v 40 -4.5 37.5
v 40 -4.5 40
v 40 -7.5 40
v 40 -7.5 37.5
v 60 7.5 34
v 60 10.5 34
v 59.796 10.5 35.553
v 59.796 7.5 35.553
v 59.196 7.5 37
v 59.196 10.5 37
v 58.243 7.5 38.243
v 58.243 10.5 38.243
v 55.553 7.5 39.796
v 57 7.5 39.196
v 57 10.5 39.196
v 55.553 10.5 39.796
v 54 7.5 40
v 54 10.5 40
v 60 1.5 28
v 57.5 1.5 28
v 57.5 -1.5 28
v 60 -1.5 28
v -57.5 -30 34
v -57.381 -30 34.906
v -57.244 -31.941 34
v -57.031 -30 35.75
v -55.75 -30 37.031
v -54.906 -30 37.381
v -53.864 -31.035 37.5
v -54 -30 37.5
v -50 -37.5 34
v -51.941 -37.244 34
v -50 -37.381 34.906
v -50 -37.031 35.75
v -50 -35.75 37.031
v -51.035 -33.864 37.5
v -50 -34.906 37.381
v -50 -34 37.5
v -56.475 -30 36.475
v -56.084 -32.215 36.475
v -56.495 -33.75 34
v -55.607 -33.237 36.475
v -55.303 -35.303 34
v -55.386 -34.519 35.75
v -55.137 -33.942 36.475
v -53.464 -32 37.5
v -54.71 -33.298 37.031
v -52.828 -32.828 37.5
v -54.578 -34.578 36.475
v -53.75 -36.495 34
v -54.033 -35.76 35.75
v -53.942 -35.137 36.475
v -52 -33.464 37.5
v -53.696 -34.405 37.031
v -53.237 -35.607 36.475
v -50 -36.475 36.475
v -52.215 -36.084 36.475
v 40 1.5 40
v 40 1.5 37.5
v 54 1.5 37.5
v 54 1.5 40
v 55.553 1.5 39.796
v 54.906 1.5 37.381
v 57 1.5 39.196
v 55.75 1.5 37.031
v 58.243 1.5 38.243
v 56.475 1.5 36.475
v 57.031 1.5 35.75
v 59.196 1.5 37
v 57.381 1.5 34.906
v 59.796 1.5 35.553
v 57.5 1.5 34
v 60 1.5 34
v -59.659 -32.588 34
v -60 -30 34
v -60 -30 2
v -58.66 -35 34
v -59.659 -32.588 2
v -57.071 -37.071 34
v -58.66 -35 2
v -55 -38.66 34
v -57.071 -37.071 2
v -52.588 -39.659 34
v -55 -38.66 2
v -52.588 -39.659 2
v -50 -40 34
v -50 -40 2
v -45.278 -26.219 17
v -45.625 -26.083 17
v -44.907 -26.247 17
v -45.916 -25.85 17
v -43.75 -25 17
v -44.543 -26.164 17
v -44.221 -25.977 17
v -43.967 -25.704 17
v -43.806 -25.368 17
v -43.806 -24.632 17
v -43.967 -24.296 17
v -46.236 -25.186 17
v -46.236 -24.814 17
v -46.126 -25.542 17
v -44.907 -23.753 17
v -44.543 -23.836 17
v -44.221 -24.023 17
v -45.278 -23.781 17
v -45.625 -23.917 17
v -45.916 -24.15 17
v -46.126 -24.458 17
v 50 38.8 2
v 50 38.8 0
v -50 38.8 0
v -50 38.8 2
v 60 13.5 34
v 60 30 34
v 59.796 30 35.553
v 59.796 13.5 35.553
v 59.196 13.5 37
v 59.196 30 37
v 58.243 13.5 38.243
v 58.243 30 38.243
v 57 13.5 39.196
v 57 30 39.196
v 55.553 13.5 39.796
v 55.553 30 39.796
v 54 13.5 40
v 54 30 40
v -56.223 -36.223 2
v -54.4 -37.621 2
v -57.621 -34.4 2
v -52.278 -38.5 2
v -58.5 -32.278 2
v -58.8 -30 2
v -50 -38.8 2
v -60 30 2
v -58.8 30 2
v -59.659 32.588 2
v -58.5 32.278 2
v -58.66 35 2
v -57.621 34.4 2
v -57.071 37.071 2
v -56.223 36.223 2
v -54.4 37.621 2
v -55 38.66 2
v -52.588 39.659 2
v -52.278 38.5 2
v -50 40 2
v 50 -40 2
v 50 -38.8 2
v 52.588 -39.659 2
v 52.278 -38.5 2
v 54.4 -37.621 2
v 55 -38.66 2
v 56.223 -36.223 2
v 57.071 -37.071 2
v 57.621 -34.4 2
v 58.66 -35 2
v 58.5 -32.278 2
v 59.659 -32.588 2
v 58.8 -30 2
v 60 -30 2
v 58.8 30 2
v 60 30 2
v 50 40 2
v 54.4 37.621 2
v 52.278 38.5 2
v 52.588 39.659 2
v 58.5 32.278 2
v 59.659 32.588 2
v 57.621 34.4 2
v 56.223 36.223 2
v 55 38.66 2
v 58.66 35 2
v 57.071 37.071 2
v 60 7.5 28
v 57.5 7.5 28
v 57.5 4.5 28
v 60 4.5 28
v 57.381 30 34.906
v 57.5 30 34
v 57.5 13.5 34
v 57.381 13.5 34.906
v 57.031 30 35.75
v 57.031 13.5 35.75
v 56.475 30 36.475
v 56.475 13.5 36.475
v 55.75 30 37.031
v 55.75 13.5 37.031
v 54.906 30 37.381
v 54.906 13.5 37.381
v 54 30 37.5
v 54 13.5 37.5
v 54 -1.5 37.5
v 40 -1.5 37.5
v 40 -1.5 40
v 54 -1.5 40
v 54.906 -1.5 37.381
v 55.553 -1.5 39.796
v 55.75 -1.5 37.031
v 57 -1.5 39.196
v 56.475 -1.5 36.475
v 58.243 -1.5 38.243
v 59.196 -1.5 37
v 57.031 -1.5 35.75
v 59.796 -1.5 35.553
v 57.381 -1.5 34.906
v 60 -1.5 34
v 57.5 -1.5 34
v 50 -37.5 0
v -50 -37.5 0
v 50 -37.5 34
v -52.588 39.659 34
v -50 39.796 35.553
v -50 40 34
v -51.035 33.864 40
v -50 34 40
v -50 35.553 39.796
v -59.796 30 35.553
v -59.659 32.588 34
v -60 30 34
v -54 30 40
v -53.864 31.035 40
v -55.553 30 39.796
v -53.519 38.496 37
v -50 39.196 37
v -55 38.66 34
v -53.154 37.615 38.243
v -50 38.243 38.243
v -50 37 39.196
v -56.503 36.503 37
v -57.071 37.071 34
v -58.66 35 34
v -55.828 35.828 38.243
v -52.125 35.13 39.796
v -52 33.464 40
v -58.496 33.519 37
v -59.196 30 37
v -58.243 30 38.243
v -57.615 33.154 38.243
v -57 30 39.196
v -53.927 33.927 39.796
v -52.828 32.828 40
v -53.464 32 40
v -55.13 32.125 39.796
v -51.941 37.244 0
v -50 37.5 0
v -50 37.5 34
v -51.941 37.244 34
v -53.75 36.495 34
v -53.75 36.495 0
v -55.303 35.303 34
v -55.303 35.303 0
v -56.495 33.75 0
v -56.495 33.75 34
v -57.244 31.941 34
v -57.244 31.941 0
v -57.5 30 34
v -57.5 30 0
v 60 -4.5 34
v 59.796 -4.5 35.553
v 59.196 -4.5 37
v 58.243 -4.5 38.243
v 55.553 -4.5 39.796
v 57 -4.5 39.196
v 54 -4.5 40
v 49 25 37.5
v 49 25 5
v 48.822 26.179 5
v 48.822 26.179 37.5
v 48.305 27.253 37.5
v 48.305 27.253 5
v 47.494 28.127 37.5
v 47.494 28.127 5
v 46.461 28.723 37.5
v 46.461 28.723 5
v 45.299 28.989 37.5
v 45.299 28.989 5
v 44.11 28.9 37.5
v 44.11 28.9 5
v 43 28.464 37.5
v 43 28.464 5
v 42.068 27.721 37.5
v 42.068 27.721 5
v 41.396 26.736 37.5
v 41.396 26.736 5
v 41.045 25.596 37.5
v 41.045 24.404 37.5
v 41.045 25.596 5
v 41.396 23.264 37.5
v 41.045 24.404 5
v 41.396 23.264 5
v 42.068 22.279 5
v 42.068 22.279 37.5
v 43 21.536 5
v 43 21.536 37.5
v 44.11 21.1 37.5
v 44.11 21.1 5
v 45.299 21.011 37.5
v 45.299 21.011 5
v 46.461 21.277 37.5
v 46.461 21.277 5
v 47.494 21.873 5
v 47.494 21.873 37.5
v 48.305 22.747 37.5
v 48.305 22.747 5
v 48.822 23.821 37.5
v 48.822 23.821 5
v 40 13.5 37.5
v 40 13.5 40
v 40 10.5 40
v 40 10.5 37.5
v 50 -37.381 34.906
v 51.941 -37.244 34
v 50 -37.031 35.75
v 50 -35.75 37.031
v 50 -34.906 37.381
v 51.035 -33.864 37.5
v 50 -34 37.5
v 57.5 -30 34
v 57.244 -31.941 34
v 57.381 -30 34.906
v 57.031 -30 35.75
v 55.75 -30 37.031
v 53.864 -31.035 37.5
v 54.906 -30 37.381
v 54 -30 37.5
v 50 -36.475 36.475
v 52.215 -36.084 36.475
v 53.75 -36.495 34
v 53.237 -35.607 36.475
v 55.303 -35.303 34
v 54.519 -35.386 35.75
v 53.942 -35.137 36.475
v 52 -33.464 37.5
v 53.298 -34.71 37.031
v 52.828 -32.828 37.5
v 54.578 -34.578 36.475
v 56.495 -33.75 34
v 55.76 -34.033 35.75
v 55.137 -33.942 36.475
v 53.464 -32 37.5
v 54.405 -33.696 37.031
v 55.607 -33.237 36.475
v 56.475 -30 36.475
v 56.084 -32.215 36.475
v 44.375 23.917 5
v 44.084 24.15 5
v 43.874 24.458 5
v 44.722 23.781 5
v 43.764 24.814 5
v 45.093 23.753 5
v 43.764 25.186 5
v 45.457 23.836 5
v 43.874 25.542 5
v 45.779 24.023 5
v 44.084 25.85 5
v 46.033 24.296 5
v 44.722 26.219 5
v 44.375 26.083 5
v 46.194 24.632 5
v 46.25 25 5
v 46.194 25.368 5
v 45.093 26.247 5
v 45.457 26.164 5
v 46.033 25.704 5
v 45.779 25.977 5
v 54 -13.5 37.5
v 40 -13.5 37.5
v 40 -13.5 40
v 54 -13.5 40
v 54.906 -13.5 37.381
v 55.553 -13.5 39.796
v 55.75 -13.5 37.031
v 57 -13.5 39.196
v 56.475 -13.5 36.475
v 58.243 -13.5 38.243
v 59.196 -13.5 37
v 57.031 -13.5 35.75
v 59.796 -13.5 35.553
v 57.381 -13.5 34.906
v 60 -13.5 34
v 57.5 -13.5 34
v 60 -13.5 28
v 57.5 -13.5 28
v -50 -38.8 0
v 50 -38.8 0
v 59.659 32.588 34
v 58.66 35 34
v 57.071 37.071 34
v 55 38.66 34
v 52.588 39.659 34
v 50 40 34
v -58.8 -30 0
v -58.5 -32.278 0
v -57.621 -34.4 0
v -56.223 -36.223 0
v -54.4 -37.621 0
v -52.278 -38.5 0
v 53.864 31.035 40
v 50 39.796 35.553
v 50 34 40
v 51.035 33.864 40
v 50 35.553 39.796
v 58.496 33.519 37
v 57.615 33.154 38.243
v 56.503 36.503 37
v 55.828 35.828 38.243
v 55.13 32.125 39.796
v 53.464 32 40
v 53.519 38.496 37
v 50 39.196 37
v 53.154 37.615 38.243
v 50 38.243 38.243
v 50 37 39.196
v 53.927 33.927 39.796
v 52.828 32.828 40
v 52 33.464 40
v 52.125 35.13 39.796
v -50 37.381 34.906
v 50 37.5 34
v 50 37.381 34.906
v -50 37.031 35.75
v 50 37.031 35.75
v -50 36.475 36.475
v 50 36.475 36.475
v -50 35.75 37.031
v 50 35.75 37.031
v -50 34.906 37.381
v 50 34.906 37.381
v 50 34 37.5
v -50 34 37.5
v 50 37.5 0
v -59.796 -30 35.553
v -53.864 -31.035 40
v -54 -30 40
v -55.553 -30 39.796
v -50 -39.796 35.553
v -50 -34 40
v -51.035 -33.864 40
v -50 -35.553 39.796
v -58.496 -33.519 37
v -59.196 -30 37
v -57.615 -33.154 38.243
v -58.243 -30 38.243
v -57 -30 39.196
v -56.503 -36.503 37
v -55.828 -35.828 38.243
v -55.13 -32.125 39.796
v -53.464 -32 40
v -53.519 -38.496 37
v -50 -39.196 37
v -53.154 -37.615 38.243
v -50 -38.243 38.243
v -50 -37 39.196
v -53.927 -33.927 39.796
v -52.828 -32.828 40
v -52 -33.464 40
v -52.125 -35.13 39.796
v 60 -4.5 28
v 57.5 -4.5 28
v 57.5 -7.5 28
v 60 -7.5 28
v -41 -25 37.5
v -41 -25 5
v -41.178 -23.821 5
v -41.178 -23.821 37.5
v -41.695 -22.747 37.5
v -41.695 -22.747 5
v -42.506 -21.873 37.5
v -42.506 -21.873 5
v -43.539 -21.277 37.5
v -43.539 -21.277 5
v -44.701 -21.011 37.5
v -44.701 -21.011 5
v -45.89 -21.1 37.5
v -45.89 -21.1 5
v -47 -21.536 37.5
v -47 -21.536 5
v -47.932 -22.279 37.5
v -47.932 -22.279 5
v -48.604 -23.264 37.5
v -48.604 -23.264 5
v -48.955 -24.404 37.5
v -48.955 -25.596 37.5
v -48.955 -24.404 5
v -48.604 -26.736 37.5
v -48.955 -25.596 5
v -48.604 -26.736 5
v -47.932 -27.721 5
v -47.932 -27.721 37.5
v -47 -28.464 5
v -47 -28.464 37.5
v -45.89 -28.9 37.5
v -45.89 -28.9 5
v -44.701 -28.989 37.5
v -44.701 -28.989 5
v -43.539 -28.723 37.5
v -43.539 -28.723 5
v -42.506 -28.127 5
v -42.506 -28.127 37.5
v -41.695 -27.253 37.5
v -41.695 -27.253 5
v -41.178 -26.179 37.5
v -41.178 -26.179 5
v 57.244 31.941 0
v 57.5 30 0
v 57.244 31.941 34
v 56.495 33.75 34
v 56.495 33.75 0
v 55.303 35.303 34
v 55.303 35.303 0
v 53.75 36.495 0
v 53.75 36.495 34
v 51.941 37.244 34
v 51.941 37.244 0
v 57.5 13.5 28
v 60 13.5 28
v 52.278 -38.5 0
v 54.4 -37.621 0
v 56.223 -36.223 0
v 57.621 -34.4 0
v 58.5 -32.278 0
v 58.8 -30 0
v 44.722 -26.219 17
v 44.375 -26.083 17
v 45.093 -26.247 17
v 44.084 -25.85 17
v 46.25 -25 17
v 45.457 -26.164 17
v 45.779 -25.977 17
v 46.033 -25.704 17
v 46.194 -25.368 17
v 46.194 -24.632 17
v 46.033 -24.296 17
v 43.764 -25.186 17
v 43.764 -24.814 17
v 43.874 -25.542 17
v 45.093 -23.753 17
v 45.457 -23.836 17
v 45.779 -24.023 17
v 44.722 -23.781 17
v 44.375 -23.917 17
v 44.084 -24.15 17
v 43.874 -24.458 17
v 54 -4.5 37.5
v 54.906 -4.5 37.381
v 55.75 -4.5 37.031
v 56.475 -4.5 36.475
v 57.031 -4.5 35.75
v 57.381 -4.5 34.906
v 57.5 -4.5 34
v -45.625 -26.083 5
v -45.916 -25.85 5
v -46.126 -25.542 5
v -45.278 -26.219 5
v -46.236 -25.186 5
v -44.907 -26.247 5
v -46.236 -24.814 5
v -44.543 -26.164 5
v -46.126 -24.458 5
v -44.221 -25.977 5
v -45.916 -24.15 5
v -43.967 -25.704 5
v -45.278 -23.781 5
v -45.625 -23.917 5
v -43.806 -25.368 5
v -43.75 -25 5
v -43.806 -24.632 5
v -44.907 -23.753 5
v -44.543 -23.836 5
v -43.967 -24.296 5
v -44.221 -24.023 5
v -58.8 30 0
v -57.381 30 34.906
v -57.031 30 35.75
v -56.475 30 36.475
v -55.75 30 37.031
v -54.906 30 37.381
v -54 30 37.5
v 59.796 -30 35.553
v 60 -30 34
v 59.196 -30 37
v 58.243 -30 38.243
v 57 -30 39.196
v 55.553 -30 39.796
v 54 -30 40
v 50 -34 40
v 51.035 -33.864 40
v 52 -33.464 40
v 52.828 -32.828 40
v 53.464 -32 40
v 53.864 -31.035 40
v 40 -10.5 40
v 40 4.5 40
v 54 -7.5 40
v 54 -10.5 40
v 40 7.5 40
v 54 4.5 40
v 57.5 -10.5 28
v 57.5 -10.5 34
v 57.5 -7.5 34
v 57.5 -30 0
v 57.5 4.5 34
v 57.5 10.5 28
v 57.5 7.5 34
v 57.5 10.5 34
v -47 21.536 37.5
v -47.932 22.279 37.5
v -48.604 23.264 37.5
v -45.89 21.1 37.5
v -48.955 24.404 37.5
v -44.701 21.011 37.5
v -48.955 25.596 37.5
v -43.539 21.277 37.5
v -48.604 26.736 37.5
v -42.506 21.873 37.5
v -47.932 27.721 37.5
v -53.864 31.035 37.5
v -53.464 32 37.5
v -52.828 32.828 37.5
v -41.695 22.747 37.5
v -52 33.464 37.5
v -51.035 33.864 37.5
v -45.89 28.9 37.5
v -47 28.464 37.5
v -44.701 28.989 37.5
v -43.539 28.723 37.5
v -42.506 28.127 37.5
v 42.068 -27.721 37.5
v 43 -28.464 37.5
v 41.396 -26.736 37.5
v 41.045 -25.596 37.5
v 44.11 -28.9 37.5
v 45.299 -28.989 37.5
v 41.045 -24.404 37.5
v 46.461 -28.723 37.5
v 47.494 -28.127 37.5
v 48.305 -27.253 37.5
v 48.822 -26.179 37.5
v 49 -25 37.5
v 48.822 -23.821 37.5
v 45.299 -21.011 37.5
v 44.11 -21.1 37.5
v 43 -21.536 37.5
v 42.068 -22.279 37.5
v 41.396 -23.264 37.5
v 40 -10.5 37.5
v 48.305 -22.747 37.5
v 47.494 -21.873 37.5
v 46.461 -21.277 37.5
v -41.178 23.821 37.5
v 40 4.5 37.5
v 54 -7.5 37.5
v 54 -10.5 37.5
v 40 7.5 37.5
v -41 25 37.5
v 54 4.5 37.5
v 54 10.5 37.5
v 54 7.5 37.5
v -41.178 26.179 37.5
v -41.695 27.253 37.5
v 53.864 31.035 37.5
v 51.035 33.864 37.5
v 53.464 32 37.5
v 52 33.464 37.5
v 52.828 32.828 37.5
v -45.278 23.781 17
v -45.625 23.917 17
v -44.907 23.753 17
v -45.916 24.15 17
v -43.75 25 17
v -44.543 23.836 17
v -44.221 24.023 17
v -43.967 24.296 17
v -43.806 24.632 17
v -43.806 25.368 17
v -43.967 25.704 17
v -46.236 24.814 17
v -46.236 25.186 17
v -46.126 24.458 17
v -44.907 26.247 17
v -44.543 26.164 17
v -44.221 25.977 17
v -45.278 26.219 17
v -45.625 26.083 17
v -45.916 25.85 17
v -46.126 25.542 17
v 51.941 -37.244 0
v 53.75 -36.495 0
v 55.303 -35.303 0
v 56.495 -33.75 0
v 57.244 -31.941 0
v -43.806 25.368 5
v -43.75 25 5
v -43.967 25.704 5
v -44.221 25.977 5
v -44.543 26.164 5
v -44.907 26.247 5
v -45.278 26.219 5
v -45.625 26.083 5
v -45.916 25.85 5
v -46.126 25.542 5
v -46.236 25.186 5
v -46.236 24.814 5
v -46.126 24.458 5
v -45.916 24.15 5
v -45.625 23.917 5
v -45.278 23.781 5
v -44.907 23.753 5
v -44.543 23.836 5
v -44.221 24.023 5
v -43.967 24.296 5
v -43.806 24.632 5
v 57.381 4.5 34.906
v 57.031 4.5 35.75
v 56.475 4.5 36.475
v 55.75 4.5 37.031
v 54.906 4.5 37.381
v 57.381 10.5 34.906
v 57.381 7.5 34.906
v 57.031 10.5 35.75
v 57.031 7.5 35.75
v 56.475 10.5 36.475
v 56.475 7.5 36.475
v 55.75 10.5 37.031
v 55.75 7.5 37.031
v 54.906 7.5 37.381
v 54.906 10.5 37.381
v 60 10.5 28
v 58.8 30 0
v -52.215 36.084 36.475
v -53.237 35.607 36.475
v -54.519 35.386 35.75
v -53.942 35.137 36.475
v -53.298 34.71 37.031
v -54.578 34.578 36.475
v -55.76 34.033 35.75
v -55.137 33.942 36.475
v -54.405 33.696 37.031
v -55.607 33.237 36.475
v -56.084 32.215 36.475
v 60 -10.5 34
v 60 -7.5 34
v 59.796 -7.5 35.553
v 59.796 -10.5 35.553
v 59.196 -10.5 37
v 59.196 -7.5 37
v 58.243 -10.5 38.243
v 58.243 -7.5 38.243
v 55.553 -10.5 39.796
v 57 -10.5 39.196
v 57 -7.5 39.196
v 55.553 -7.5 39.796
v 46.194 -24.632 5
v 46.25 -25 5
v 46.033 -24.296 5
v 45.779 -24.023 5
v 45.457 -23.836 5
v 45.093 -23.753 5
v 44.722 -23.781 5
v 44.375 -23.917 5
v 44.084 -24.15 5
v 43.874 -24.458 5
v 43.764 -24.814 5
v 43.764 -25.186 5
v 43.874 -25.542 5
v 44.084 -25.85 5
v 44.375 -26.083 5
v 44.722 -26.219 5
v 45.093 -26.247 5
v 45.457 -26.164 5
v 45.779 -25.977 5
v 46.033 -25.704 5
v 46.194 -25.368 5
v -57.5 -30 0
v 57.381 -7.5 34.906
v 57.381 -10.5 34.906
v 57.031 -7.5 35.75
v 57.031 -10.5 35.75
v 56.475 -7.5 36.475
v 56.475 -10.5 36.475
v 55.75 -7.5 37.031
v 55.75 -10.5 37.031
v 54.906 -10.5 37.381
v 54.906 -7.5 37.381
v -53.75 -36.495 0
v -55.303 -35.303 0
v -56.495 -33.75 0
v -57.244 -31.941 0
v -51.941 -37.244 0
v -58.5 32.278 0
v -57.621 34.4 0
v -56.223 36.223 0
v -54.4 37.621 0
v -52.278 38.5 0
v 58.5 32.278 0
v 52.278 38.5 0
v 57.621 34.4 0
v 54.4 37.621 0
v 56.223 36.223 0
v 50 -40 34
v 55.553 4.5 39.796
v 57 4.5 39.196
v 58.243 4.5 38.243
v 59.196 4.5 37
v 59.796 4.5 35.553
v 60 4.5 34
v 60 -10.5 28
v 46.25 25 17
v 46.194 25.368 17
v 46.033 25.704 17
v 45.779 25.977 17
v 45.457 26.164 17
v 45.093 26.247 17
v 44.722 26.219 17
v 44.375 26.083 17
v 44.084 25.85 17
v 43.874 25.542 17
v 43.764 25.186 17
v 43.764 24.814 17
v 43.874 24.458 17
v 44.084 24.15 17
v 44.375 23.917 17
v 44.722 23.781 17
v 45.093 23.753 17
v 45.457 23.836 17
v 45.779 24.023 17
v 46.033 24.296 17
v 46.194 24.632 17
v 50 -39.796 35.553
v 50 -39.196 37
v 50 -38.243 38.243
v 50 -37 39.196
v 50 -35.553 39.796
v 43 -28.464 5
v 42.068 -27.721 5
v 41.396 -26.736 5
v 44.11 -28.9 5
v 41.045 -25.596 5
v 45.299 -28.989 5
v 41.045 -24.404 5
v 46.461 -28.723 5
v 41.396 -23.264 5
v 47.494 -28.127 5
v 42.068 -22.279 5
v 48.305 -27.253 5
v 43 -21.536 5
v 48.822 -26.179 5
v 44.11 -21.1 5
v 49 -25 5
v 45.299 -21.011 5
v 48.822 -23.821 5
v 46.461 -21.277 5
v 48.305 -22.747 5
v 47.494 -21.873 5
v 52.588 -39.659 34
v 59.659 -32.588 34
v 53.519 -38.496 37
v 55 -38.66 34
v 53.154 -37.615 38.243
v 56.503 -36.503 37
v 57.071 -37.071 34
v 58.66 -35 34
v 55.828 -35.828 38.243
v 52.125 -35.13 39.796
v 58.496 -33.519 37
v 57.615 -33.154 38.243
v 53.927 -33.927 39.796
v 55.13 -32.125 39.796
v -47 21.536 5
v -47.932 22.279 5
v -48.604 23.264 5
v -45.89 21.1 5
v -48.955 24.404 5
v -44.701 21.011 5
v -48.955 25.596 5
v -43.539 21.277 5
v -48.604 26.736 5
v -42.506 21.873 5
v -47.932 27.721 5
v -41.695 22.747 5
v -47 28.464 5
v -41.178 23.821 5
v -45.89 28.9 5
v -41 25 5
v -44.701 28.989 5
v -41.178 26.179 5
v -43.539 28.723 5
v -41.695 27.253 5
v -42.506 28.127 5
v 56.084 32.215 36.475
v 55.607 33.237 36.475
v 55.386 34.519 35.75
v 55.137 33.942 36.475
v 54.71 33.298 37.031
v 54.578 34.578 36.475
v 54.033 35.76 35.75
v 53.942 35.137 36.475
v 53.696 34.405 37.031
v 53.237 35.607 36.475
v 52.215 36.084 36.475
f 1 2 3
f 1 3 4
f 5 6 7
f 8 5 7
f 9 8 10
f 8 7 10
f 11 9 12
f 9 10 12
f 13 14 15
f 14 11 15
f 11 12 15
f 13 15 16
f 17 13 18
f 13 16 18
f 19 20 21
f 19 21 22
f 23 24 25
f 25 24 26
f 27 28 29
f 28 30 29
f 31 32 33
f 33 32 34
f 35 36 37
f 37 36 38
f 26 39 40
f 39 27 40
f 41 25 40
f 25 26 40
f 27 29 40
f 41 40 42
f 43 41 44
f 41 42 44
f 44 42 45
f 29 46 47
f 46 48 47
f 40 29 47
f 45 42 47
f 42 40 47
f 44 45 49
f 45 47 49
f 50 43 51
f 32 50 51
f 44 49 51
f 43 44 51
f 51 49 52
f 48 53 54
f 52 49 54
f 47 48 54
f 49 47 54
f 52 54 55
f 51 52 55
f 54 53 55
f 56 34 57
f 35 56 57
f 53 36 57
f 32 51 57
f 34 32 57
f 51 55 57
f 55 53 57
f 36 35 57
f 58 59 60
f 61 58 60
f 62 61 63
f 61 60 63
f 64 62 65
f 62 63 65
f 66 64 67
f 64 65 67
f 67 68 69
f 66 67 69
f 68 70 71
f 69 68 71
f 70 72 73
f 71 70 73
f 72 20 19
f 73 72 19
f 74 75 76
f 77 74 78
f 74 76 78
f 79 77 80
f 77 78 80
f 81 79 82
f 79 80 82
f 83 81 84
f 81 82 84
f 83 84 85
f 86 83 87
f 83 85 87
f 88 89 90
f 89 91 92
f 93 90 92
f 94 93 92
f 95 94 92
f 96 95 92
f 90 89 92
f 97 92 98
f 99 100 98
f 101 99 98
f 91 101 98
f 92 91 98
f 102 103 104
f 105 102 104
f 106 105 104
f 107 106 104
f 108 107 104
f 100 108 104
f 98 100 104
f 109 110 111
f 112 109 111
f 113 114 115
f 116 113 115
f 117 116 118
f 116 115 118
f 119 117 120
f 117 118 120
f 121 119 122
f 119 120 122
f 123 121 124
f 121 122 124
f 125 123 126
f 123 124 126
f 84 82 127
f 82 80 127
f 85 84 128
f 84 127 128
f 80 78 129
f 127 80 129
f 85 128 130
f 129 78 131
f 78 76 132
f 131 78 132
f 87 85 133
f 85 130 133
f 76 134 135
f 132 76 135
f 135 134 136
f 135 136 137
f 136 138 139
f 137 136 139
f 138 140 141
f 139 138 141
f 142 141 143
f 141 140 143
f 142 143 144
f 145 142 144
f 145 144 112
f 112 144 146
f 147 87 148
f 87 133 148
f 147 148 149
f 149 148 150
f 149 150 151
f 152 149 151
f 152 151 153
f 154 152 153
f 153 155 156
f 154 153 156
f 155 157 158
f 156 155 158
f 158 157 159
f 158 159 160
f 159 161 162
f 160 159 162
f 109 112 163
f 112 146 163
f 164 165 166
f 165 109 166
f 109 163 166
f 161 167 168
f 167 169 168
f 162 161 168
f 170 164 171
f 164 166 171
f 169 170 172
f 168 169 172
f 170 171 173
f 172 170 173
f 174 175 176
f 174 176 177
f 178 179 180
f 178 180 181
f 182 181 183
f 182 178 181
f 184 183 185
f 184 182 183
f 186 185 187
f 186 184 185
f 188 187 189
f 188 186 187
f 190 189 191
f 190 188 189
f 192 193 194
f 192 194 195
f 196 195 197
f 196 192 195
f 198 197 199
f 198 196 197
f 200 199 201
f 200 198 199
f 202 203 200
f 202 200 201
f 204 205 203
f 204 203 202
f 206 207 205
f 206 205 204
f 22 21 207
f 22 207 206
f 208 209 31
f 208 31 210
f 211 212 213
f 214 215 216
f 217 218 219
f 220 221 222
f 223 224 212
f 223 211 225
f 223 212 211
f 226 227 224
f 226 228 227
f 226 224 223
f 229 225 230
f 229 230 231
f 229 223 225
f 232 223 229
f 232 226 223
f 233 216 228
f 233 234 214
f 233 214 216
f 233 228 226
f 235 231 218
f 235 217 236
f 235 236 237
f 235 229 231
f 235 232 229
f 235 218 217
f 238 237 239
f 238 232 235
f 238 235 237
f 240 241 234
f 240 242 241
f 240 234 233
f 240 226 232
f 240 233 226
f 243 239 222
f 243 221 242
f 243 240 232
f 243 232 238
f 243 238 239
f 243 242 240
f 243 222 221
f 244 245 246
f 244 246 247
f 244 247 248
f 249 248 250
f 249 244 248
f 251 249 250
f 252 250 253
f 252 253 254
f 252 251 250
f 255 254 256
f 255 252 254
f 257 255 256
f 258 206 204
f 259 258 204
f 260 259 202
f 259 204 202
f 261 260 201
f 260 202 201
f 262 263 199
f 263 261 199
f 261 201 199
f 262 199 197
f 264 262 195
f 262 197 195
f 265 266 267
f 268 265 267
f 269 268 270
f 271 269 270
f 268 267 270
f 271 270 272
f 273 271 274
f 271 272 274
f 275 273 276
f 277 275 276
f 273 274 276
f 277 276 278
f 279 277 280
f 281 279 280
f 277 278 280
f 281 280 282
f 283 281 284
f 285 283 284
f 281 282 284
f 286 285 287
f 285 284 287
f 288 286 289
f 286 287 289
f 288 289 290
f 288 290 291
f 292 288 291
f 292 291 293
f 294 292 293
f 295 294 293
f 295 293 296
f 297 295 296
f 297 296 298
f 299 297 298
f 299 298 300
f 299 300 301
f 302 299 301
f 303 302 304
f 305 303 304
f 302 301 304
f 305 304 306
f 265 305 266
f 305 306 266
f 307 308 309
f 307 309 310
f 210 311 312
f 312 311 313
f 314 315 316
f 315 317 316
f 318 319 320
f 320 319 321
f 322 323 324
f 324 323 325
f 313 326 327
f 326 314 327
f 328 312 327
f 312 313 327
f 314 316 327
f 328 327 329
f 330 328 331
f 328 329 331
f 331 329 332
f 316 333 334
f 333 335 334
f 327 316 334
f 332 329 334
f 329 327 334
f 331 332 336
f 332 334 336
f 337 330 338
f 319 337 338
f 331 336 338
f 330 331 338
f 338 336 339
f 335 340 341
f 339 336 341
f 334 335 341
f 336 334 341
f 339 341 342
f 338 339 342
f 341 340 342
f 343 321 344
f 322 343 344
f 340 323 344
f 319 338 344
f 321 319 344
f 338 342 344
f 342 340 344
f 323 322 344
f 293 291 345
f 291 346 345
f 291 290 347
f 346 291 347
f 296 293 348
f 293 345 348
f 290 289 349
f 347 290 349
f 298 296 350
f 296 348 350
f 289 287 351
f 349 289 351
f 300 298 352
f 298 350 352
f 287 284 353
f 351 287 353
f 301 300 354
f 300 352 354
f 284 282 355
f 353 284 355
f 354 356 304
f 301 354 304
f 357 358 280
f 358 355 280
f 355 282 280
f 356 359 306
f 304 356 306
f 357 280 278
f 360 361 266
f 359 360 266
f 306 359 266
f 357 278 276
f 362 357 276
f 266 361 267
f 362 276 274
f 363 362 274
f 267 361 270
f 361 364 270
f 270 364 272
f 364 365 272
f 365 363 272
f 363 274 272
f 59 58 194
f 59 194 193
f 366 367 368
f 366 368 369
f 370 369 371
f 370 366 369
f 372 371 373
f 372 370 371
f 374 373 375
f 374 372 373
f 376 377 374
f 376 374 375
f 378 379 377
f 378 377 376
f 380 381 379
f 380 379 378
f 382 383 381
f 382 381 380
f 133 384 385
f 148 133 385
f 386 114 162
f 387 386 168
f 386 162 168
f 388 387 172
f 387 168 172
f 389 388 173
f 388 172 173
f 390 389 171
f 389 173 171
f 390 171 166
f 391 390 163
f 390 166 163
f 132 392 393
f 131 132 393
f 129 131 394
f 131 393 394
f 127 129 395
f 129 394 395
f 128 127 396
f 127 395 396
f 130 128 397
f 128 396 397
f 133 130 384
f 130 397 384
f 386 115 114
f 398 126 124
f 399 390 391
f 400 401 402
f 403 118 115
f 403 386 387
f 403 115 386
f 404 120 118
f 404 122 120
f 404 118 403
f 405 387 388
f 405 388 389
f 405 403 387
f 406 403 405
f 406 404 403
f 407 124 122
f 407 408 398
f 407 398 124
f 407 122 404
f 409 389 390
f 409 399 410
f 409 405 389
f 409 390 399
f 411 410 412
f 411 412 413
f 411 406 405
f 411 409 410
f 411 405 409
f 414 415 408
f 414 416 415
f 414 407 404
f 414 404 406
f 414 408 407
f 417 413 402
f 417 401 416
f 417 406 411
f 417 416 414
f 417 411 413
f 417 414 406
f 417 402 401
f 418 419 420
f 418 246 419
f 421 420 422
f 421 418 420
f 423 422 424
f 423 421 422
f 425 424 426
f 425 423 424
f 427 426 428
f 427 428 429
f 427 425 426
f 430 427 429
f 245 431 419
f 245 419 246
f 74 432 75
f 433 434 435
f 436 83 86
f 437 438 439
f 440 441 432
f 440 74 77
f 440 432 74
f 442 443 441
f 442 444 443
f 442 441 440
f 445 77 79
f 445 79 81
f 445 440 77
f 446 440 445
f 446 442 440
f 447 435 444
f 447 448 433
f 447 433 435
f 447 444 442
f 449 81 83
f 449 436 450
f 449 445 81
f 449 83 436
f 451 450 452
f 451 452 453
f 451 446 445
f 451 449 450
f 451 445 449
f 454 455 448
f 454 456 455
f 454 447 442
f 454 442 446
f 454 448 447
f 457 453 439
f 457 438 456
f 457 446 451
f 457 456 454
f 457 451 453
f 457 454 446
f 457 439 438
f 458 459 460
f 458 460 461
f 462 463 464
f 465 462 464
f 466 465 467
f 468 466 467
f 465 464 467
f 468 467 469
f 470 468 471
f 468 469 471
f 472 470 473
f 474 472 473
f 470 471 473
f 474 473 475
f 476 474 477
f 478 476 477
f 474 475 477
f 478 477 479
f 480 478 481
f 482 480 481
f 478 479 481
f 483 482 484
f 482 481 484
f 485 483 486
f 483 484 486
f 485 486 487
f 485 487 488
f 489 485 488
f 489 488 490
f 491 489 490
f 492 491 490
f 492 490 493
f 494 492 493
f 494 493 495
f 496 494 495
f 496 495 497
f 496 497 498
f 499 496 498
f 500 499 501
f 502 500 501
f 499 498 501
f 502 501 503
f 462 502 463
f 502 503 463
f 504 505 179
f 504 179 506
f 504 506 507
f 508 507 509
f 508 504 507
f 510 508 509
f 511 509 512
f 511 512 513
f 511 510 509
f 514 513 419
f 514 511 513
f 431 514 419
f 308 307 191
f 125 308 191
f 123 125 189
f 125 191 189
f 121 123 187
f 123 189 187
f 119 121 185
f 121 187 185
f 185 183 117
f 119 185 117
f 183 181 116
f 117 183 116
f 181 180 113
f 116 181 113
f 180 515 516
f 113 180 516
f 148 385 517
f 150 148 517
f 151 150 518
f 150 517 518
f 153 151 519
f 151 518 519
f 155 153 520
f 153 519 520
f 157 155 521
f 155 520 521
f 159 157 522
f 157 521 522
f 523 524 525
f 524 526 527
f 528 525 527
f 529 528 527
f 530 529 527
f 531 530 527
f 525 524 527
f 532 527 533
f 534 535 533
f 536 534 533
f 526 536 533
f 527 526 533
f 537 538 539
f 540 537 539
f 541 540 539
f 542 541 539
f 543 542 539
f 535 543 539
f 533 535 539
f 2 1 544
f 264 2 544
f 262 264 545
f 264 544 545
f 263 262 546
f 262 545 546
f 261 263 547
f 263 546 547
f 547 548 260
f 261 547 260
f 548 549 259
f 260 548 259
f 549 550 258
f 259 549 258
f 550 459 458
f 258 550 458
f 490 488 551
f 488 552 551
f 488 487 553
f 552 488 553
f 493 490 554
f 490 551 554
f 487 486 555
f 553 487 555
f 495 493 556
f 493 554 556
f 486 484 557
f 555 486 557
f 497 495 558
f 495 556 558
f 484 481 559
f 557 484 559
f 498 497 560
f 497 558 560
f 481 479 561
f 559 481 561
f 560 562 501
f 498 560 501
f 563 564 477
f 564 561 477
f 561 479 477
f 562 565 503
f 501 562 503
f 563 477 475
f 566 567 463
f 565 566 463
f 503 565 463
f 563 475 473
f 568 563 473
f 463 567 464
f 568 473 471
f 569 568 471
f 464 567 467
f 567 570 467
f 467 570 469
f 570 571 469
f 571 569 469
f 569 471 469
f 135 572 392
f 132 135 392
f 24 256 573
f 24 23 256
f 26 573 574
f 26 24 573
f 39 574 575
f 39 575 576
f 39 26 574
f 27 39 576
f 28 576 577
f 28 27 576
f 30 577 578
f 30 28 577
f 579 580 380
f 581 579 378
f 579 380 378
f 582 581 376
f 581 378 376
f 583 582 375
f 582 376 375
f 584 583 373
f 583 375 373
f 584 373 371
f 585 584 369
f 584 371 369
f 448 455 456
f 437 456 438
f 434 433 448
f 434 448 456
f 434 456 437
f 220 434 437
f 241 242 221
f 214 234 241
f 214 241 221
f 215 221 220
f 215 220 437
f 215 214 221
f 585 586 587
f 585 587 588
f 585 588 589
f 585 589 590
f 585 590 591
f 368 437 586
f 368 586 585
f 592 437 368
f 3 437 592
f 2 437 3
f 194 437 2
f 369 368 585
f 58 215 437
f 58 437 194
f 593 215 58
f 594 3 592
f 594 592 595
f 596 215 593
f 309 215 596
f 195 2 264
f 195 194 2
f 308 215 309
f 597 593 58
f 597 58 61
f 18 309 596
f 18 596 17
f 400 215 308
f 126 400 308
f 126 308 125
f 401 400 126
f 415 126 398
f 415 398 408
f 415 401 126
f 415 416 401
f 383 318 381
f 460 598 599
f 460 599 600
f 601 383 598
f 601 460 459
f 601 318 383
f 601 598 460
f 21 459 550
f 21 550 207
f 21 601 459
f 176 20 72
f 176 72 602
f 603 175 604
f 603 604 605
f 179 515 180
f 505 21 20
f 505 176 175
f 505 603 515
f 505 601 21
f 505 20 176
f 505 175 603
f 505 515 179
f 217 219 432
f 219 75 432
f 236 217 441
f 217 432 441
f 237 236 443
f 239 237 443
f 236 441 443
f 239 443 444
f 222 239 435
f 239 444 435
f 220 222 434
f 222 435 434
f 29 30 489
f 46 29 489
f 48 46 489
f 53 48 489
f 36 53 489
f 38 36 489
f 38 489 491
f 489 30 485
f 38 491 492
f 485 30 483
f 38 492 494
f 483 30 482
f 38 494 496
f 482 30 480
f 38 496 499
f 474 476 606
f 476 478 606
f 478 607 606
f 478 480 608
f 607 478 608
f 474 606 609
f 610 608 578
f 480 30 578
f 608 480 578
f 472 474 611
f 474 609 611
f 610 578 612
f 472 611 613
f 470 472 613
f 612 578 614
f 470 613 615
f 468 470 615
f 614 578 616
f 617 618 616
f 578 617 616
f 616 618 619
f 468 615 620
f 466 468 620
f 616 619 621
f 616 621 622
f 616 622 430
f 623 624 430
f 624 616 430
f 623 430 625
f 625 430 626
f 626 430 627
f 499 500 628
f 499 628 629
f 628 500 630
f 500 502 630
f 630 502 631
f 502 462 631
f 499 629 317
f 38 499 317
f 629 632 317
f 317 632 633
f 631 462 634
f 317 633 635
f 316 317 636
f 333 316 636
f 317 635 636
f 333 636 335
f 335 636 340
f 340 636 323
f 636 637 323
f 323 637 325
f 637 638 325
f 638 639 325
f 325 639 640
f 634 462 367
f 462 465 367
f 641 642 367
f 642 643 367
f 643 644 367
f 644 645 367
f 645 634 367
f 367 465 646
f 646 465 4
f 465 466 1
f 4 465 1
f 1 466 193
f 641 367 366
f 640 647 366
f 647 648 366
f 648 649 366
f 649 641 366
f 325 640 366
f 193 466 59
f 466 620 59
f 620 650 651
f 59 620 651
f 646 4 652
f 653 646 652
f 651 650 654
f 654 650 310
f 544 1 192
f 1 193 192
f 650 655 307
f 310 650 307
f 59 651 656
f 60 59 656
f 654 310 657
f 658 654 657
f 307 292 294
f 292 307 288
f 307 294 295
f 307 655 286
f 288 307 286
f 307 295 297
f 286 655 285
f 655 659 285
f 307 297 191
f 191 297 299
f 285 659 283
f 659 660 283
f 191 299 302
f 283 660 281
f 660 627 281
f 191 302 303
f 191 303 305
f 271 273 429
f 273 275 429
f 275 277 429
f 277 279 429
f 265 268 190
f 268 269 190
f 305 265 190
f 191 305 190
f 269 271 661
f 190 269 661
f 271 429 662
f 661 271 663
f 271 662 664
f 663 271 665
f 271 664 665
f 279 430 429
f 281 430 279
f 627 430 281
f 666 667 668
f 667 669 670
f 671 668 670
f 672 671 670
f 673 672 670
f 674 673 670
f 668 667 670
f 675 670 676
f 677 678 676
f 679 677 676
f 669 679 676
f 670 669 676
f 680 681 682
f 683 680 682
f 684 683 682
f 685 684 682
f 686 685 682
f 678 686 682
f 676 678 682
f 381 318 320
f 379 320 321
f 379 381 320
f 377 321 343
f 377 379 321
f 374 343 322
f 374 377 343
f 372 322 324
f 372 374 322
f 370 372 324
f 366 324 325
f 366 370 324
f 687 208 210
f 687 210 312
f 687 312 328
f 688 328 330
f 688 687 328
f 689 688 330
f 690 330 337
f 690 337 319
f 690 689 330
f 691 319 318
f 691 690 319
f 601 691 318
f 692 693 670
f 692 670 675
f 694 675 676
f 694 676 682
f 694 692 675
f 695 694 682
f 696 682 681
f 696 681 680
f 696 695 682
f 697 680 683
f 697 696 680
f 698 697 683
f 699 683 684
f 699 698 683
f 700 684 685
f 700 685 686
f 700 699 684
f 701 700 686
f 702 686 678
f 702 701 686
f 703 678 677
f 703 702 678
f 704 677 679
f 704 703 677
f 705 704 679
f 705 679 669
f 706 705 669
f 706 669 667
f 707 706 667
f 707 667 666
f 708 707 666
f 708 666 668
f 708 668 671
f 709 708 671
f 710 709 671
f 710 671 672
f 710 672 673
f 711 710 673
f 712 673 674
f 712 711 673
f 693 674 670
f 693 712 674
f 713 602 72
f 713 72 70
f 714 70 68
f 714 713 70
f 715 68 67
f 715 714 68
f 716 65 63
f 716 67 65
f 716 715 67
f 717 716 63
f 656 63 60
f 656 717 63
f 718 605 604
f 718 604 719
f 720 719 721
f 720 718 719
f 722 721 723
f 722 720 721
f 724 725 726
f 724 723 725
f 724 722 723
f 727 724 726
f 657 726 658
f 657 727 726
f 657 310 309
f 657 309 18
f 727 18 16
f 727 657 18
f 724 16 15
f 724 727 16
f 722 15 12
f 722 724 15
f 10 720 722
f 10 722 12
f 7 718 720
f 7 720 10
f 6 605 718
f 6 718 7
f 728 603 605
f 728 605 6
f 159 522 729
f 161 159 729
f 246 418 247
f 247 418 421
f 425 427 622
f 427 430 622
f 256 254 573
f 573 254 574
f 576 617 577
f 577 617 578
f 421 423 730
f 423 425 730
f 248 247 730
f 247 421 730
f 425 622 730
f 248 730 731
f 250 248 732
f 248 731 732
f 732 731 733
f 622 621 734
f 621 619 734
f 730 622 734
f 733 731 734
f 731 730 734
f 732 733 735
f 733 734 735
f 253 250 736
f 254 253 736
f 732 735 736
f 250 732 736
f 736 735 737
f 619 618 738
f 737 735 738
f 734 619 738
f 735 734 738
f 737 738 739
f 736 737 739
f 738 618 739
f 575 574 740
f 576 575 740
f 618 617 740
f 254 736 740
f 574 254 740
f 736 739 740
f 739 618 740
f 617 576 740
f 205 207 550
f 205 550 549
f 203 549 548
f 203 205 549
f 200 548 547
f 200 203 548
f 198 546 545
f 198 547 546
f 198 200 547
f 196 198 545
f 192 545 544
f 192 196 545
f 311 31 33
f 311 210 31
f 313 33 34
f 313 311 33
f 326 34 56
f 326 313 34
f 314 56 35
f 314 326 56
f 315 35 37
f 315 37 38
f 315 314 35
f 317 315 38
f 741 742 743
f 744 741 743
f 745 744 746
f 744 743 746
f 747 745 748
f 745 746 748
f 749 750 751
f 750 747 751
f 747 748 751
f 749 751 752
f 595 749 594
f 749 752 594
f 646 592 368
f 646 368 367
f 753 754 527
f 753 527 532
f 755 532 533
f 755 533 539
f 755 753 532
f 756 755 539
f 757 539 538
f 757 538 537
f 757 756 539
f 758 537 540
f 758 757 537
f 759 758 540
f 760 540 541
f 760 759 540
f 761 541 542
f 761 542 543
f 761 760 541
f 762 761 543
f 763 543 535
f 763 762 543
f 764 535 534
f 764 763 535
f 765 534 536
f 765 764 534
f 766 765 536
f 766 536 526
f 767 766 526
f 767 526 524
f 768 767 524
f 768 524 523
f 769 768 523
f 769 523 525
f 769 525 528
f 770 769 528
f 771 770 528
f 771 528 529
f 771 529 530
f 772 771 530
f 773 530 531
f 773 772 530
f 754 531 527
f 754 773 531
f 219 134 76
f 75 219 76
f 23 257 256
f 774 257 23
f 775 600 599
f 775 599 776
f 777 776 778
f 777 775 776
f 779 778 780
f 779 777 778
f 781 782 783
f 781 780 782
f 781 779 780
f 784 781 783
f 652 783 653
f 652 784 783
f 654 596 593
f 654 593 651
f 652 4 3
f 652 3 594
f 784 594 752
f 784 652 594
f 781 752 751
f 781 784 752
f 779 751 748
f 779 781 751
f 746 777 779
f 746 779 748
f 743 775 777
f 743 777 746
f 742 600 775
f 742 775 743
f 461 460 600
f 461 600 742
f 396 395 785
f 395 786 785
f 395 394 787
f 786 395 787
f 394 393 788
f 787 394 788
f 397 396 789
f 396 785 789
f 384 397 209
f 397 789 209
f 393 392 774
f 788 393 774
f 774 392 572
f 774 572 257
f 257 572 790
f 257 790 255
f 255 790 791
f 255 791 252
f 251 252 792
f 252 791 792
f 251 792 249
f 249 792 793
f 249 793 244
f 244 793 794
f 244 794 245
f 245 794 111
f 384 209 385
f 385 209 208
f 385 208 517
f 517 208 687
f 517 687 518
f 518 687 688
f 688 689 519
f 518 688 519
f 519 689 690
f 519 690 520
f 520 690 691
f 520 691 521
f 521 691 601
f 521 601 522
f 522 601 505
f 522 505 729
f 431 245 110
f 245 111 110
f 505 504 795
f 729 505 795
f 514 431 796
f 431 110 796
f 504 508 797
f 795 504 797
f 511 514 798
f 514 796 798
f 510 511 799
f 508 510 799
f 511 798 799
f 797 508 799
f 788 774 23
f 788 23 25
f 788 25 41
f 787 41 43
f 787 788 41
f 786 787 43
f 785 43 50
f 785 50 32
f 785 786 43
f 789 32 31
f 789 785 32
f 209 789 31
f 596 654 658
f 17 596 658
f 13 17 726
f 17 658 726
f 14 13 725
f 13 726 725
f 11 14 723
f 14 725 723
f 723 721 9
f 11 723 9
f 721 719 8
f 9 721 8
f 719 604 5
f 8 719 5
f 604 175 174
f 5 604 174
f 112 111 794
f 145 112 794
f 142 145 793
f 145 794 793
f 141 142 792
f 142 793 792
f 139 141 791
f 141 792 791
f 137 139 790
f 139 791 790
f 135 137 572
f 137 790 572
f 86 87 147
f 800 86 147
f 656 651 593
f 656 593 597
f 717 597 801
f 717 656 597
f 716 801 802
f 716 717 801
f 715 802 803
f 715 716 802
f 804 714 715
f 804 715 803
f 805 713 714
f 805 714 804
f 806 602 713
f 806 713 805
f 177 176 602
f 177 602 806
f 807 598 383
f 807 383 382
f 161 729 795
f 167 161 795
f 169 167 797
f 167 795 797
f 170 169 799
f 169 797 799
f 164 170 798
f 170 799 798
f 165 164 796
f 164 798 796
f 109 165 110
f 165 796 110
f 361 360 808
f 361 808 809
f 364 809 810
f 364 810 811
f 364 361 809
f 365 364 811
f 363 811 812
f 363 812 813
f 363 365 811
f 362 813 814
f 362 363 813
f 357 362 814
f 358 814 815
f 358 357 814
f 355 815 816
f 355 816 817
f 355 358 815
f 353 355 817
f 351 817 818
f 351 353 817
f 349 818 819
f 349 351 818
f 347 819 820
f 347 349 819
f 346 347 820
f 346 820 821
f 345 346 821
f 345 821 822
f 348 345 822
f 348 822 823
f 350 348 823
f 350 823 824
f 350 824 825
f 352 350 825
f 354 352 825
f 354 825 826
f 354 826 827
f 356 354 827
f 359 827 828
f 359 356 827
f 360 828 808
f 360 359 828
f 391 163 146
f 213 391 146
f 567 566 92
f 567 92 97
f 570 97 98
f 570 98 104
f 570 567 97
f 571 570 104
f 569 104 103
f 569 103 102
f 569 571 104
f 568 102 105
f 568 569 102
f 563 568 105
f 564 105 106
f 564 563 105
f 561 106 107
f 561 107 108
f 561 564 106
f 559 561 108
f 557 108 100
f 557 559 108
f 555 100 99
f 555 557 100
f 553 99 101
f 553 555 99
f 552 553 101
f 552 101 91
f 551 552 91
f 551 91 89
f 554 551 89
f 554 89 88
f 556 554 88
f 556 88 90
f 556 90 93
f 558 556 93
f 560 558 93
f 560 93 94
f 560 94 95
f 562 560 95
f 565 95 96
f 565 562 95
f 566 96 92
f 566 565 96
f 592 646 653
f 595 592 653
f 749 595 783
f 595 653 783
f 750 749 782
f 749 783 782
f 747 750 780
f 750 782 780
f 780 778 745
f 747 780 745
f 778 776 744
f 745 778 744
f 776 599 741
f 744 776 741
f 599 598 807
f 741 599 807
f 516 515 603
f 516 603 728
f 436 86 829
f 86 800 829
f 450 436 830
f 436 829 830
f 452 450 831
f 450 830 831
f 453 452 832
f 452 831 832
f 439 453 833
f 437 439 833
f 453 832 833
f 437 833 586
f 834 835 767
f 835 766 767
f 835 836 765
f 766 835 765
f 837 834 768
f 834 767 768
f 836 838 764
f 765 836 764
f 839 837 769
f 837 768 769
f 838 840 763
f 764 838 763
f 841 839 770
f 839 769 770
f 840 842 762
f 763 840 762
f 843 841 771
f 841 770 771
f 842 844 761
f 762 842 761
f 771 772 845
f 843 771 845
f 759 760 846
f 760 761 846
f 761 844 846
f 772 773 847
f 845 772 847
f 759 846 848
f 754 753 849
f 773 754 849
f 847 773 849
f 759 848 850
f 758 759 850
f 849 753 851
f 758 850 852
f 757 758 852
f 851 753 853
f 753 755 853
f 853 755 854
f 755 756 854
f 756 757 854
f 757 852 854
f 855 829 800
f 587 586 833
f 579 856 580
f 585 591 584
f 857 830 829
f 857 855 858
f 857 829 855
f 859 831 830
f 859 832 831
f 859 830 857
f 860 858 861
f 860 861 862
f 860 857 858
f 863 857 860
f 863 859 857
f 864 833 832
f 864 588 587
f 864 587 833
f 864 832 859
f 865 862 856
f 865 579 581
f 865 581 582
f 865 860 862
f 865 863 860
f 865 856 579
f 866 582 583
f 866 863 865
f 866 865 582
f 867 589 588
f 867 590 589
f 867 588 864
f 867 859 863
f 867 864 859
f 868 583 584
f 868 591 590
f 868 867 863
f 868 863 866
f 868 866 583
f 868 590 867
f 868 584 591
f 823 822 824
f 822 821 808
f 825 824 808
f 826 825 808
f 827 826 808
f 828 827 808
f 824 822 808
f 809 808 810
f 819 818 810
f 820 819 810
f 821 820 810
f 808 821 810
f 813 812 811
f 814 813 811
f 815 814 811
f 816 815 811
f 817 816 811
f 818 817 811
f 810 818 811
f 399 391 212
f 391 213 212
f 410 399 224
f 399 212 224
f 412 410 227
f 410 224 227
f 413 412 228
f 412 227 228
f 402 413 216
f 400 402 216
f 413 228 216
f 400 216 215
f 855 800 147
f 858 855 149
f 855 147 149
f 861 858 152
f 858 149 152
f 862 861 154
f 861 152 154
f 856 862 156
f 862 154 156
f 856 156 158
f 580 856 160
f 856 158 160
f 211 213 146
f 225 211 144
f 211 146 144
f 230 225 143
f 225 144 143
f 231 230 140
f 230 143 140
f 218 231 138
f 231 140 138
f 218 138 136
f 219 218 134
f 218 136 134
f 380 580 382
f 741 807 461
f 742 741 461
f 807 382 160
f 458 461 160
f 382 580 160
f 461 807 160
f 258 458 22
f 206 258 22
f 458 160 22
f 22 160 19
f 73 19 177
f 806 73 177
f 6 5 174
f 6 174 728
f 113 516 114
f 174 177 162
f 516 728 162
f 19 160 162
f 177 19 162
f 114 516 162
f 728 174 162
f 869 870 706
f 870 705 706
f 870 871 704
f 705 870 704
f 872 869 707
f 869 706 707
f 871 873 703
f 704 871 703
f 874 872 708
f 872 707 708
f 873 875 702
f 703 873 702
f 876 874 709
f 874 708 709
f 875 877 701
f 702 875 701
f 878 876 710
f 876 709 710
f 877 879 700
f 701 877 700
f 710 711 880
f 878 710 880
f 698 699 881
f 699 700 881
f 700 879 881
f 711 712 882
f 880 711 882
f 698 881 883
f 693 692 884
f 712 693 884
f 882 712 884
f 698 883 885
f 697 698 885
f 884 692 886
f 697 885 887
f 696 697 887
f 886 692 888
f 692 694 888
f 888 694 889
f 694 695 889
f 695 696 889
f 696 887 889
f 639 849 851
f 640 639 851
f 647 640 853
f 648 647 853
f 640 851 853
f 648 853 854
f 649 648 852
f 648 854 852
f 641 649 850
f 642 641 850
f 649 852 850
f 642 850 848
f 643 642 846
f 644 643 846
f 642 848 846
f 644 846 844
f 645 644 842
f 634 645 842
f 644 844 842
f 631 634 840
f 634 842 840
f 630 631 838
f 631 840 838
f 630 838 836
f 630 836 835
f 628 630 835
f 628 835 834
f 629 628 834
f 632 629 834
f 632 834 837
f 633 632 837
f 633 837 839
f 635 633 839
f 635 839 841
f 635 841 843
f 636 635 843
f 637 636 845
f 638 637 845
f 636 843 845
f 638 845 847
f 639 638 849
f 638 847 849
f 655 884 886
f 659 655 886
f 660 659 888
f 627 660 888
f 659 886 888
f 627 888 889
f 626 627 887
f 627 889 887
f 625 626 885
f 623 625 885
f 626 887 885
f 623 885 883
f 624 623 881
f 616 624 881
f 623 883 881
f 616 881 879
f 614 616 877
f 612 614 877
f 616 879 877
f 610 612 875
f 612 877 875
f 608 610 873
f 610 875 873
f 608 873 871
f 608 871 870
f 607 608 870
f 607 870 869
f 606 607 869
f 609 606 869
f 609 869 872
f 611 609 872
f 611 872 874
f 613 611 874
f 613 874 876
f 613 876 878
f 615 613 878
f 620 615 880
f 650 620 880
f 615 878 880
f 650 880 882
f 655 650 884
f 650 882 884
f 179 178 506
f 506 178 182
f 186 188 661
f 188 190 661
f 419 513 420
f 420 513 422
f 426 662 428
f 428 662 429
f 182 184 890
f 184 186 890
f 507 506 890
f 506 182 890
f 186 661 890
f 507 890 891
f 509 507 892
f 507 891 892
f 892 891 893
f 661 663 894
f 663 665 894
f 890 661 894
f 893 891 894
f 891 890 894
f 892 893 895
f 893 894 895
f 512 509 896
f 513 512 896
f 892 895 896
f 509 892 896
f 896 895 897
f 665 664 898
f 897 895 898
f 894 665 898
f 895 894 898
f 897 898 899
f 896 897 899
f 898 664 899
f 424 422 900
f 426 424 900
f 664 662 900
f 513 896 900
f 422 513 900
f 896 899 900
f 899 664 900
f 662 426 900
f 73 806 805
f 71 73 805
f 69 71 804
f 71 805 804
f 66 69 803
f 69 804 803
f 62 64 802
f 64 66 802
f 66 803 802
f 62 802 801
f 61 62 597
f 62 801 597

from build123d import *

# Parameters (mm, degrees)
EXTRUDE_1_DEPTH        = 40
FILLET_1_R             = 6
SHELL_1_T              = -2.5
CUT_EXTRUDE_1_DEPTH    = 2
SKETCH_5_W             = 25
SKETCH_5_H             = 17
CUT_EXTRUDE_4_DEPTH    = 1.5
PATTERN_LINEAR_1_COUNT = 5
PATTERN_LINEAR_1_PITCH = 6
SKETCH_6_R             = 4
EXTRUDE_2_DEPTH        = 32.5
SKETCH_7_R             = 1.25
CUT_EXTRUDE_5_DEPTH    = 12


with BuildPart() as part:
    # 草图1 → 凸台-拉伸1 (new body)
    with BuildSketch(Plane.XY):
        with BuildLine():
            Line((-50, -40), (50, -40))
            ThreePointArc((50, -40), (57.071067812, -37.071067812), (60, -30))
            Line((60, -30), (60, 30))
            ThreePointArc((60, 30), (57.071067812, 37.071067812), (50, 40))
            Line((50, 40), (-50, 40))
            ThreePointArc((-50, 40), (-57.071067812, 37.071067812), (-60, 30))
            Line((-60, 30), (-60, -30))
            ThreePointArc((-60, -30), (-57.071067812, -37.071067812), (-50, -40))
        make_face()
    extrude(amount=EXTRUDE_1_DEPTH)

    # 圆角1
    fillet_1_edges = [part.edges().sort_by_distance(p)[0] for p in [
        (57.071067812, -37.071067812, 40),
        (60, 0, 40),
        (57.071067812, 37.071067812, 40),
        (0, 40, 40),
        (-57.071067812, 37.071067812, 40),
        (-60, 0, 40),
        (-57.071067812, -37.071067812, 40),
        (0, -40, 40),
    ]]
    fillet(fillet_1_edges, radius=FILLET_1_R)

    # 抽壳1
    shell_1_openings = [part.faces().sort_by_distance(p)[0] for p in [
        (0, 0, 0),
    ]]
    offset(amount=SHELL_1_T, openings=shell_1_openings, kind=Kind.INTERSECTION)

    # 草图2 → 切除-拉伸1 (cut)
    with BuildSketch(Plane.XY):
        with BuildLine():
            Line((-50, -45), (50, -45))
            ThreePointArc((50, -45), (60.606601718, -40.606601718), (65, -30))
            Line((65, -30), (65, 30))
            ThreePointArc((65, 30), (60.606601718, 40.606601718), (50, 45))
            Line((50, 45), (-50, 45))
            ThreePointArc((-50, 45), (-60.606601718, 40.606601718), (-65, 30))
            Line((-65, 30), (-65, -30))
            ThreePointArc((-65, -30), (-60.606601718, -40.606601718), (-50, -45))
        make_face()
        with BuildLine():
            Line((-50, -38.8), (50, -38.8))
            ThreePointArc((50, -38.8), (56.222539674, -36.222539674), (58.8, -30))
            Line((58.8, -30), (58.8, 30))
            ThreePointArc((58.8, 30), (56.222539674, 36.222539674), (50, 38.8))
            Line((50, 38.8), (-50, 38.8))
            ThreePointArc((-50, 38.8), (-56.222539674, 36.222539674), (-58.8, 30))
            Line((-58.8, 30), (-58.8, -30))
            ThreePointArc((-58.8, -30), (-56.222539674, -36.222539674), (-50, -38.8))
        make_face(mode=Mode.SUBTRACT)
    extrude(amount=CUT_EXTRUDE_1_DEPTH, mode=Mode.SUBTRACT)

    # 草图5 → 切除-拉伸4 (cut, symmetric)
    with BuildSketch(Plane(origin=(0, -12, 0), x_dir=(1, 0, 0), z_dir=(0, 1, 0))):
        with Locations((52.5, -36.5)):
            Rectangle(SKETCH_5_W, SKETCH_5_H)
    cut_extrude_4 = extrude(amount=CUT_EXTRUDE_4_DEPTH, both=True, mode=Mode.SUBTRACT)

    # 阵列(线性)1: 切除-拉伸4 ×5
    with Locations(*[(0, i * PATTERN_LINEAR_1_PITCH, 0) for i in range(1, PATTERN_LINEAR_1_COUNT)]):
        add(cut_extrude_4, mode=Mode.SUBTRACT)

    # 草图6 → 凸台-拉伸2 (add)
    with BuildSketch(Plane.XY.offset(5)):
        with Locations((45, 25)):
            Circle(SKETCH_6_R)
        with Locations((45, -25)):
            Circle(SKETCH_6_R)
        with Locations((-45, 25)):
            Circle(SKETCH_6_R)
        with Locations((-45, -25)):
            Circle(SKETCH_6_R)
    extrude(amount=EXTRUDE_2_DEPTH)

    # 草图7 → 切除-拉伸5 (cut)
    with BuildSketch(Plane.XY.offset(5)):
        with Locations((45, 25)):
            Circle(SKETCH_7_R)
        with Locations((45, -25)):
            Circle(SKETCH_7_R)
        with Locations((-45, 25)):
            Circle(SKETCH_7_R)
        with Locations((-45, -25)):
            Circle(SKETCH_7_R)
    extrude(amount=CUT_EXTRUDE_5_DEPTH, mode=Mode.SUBTRACT)


solid = part.part
